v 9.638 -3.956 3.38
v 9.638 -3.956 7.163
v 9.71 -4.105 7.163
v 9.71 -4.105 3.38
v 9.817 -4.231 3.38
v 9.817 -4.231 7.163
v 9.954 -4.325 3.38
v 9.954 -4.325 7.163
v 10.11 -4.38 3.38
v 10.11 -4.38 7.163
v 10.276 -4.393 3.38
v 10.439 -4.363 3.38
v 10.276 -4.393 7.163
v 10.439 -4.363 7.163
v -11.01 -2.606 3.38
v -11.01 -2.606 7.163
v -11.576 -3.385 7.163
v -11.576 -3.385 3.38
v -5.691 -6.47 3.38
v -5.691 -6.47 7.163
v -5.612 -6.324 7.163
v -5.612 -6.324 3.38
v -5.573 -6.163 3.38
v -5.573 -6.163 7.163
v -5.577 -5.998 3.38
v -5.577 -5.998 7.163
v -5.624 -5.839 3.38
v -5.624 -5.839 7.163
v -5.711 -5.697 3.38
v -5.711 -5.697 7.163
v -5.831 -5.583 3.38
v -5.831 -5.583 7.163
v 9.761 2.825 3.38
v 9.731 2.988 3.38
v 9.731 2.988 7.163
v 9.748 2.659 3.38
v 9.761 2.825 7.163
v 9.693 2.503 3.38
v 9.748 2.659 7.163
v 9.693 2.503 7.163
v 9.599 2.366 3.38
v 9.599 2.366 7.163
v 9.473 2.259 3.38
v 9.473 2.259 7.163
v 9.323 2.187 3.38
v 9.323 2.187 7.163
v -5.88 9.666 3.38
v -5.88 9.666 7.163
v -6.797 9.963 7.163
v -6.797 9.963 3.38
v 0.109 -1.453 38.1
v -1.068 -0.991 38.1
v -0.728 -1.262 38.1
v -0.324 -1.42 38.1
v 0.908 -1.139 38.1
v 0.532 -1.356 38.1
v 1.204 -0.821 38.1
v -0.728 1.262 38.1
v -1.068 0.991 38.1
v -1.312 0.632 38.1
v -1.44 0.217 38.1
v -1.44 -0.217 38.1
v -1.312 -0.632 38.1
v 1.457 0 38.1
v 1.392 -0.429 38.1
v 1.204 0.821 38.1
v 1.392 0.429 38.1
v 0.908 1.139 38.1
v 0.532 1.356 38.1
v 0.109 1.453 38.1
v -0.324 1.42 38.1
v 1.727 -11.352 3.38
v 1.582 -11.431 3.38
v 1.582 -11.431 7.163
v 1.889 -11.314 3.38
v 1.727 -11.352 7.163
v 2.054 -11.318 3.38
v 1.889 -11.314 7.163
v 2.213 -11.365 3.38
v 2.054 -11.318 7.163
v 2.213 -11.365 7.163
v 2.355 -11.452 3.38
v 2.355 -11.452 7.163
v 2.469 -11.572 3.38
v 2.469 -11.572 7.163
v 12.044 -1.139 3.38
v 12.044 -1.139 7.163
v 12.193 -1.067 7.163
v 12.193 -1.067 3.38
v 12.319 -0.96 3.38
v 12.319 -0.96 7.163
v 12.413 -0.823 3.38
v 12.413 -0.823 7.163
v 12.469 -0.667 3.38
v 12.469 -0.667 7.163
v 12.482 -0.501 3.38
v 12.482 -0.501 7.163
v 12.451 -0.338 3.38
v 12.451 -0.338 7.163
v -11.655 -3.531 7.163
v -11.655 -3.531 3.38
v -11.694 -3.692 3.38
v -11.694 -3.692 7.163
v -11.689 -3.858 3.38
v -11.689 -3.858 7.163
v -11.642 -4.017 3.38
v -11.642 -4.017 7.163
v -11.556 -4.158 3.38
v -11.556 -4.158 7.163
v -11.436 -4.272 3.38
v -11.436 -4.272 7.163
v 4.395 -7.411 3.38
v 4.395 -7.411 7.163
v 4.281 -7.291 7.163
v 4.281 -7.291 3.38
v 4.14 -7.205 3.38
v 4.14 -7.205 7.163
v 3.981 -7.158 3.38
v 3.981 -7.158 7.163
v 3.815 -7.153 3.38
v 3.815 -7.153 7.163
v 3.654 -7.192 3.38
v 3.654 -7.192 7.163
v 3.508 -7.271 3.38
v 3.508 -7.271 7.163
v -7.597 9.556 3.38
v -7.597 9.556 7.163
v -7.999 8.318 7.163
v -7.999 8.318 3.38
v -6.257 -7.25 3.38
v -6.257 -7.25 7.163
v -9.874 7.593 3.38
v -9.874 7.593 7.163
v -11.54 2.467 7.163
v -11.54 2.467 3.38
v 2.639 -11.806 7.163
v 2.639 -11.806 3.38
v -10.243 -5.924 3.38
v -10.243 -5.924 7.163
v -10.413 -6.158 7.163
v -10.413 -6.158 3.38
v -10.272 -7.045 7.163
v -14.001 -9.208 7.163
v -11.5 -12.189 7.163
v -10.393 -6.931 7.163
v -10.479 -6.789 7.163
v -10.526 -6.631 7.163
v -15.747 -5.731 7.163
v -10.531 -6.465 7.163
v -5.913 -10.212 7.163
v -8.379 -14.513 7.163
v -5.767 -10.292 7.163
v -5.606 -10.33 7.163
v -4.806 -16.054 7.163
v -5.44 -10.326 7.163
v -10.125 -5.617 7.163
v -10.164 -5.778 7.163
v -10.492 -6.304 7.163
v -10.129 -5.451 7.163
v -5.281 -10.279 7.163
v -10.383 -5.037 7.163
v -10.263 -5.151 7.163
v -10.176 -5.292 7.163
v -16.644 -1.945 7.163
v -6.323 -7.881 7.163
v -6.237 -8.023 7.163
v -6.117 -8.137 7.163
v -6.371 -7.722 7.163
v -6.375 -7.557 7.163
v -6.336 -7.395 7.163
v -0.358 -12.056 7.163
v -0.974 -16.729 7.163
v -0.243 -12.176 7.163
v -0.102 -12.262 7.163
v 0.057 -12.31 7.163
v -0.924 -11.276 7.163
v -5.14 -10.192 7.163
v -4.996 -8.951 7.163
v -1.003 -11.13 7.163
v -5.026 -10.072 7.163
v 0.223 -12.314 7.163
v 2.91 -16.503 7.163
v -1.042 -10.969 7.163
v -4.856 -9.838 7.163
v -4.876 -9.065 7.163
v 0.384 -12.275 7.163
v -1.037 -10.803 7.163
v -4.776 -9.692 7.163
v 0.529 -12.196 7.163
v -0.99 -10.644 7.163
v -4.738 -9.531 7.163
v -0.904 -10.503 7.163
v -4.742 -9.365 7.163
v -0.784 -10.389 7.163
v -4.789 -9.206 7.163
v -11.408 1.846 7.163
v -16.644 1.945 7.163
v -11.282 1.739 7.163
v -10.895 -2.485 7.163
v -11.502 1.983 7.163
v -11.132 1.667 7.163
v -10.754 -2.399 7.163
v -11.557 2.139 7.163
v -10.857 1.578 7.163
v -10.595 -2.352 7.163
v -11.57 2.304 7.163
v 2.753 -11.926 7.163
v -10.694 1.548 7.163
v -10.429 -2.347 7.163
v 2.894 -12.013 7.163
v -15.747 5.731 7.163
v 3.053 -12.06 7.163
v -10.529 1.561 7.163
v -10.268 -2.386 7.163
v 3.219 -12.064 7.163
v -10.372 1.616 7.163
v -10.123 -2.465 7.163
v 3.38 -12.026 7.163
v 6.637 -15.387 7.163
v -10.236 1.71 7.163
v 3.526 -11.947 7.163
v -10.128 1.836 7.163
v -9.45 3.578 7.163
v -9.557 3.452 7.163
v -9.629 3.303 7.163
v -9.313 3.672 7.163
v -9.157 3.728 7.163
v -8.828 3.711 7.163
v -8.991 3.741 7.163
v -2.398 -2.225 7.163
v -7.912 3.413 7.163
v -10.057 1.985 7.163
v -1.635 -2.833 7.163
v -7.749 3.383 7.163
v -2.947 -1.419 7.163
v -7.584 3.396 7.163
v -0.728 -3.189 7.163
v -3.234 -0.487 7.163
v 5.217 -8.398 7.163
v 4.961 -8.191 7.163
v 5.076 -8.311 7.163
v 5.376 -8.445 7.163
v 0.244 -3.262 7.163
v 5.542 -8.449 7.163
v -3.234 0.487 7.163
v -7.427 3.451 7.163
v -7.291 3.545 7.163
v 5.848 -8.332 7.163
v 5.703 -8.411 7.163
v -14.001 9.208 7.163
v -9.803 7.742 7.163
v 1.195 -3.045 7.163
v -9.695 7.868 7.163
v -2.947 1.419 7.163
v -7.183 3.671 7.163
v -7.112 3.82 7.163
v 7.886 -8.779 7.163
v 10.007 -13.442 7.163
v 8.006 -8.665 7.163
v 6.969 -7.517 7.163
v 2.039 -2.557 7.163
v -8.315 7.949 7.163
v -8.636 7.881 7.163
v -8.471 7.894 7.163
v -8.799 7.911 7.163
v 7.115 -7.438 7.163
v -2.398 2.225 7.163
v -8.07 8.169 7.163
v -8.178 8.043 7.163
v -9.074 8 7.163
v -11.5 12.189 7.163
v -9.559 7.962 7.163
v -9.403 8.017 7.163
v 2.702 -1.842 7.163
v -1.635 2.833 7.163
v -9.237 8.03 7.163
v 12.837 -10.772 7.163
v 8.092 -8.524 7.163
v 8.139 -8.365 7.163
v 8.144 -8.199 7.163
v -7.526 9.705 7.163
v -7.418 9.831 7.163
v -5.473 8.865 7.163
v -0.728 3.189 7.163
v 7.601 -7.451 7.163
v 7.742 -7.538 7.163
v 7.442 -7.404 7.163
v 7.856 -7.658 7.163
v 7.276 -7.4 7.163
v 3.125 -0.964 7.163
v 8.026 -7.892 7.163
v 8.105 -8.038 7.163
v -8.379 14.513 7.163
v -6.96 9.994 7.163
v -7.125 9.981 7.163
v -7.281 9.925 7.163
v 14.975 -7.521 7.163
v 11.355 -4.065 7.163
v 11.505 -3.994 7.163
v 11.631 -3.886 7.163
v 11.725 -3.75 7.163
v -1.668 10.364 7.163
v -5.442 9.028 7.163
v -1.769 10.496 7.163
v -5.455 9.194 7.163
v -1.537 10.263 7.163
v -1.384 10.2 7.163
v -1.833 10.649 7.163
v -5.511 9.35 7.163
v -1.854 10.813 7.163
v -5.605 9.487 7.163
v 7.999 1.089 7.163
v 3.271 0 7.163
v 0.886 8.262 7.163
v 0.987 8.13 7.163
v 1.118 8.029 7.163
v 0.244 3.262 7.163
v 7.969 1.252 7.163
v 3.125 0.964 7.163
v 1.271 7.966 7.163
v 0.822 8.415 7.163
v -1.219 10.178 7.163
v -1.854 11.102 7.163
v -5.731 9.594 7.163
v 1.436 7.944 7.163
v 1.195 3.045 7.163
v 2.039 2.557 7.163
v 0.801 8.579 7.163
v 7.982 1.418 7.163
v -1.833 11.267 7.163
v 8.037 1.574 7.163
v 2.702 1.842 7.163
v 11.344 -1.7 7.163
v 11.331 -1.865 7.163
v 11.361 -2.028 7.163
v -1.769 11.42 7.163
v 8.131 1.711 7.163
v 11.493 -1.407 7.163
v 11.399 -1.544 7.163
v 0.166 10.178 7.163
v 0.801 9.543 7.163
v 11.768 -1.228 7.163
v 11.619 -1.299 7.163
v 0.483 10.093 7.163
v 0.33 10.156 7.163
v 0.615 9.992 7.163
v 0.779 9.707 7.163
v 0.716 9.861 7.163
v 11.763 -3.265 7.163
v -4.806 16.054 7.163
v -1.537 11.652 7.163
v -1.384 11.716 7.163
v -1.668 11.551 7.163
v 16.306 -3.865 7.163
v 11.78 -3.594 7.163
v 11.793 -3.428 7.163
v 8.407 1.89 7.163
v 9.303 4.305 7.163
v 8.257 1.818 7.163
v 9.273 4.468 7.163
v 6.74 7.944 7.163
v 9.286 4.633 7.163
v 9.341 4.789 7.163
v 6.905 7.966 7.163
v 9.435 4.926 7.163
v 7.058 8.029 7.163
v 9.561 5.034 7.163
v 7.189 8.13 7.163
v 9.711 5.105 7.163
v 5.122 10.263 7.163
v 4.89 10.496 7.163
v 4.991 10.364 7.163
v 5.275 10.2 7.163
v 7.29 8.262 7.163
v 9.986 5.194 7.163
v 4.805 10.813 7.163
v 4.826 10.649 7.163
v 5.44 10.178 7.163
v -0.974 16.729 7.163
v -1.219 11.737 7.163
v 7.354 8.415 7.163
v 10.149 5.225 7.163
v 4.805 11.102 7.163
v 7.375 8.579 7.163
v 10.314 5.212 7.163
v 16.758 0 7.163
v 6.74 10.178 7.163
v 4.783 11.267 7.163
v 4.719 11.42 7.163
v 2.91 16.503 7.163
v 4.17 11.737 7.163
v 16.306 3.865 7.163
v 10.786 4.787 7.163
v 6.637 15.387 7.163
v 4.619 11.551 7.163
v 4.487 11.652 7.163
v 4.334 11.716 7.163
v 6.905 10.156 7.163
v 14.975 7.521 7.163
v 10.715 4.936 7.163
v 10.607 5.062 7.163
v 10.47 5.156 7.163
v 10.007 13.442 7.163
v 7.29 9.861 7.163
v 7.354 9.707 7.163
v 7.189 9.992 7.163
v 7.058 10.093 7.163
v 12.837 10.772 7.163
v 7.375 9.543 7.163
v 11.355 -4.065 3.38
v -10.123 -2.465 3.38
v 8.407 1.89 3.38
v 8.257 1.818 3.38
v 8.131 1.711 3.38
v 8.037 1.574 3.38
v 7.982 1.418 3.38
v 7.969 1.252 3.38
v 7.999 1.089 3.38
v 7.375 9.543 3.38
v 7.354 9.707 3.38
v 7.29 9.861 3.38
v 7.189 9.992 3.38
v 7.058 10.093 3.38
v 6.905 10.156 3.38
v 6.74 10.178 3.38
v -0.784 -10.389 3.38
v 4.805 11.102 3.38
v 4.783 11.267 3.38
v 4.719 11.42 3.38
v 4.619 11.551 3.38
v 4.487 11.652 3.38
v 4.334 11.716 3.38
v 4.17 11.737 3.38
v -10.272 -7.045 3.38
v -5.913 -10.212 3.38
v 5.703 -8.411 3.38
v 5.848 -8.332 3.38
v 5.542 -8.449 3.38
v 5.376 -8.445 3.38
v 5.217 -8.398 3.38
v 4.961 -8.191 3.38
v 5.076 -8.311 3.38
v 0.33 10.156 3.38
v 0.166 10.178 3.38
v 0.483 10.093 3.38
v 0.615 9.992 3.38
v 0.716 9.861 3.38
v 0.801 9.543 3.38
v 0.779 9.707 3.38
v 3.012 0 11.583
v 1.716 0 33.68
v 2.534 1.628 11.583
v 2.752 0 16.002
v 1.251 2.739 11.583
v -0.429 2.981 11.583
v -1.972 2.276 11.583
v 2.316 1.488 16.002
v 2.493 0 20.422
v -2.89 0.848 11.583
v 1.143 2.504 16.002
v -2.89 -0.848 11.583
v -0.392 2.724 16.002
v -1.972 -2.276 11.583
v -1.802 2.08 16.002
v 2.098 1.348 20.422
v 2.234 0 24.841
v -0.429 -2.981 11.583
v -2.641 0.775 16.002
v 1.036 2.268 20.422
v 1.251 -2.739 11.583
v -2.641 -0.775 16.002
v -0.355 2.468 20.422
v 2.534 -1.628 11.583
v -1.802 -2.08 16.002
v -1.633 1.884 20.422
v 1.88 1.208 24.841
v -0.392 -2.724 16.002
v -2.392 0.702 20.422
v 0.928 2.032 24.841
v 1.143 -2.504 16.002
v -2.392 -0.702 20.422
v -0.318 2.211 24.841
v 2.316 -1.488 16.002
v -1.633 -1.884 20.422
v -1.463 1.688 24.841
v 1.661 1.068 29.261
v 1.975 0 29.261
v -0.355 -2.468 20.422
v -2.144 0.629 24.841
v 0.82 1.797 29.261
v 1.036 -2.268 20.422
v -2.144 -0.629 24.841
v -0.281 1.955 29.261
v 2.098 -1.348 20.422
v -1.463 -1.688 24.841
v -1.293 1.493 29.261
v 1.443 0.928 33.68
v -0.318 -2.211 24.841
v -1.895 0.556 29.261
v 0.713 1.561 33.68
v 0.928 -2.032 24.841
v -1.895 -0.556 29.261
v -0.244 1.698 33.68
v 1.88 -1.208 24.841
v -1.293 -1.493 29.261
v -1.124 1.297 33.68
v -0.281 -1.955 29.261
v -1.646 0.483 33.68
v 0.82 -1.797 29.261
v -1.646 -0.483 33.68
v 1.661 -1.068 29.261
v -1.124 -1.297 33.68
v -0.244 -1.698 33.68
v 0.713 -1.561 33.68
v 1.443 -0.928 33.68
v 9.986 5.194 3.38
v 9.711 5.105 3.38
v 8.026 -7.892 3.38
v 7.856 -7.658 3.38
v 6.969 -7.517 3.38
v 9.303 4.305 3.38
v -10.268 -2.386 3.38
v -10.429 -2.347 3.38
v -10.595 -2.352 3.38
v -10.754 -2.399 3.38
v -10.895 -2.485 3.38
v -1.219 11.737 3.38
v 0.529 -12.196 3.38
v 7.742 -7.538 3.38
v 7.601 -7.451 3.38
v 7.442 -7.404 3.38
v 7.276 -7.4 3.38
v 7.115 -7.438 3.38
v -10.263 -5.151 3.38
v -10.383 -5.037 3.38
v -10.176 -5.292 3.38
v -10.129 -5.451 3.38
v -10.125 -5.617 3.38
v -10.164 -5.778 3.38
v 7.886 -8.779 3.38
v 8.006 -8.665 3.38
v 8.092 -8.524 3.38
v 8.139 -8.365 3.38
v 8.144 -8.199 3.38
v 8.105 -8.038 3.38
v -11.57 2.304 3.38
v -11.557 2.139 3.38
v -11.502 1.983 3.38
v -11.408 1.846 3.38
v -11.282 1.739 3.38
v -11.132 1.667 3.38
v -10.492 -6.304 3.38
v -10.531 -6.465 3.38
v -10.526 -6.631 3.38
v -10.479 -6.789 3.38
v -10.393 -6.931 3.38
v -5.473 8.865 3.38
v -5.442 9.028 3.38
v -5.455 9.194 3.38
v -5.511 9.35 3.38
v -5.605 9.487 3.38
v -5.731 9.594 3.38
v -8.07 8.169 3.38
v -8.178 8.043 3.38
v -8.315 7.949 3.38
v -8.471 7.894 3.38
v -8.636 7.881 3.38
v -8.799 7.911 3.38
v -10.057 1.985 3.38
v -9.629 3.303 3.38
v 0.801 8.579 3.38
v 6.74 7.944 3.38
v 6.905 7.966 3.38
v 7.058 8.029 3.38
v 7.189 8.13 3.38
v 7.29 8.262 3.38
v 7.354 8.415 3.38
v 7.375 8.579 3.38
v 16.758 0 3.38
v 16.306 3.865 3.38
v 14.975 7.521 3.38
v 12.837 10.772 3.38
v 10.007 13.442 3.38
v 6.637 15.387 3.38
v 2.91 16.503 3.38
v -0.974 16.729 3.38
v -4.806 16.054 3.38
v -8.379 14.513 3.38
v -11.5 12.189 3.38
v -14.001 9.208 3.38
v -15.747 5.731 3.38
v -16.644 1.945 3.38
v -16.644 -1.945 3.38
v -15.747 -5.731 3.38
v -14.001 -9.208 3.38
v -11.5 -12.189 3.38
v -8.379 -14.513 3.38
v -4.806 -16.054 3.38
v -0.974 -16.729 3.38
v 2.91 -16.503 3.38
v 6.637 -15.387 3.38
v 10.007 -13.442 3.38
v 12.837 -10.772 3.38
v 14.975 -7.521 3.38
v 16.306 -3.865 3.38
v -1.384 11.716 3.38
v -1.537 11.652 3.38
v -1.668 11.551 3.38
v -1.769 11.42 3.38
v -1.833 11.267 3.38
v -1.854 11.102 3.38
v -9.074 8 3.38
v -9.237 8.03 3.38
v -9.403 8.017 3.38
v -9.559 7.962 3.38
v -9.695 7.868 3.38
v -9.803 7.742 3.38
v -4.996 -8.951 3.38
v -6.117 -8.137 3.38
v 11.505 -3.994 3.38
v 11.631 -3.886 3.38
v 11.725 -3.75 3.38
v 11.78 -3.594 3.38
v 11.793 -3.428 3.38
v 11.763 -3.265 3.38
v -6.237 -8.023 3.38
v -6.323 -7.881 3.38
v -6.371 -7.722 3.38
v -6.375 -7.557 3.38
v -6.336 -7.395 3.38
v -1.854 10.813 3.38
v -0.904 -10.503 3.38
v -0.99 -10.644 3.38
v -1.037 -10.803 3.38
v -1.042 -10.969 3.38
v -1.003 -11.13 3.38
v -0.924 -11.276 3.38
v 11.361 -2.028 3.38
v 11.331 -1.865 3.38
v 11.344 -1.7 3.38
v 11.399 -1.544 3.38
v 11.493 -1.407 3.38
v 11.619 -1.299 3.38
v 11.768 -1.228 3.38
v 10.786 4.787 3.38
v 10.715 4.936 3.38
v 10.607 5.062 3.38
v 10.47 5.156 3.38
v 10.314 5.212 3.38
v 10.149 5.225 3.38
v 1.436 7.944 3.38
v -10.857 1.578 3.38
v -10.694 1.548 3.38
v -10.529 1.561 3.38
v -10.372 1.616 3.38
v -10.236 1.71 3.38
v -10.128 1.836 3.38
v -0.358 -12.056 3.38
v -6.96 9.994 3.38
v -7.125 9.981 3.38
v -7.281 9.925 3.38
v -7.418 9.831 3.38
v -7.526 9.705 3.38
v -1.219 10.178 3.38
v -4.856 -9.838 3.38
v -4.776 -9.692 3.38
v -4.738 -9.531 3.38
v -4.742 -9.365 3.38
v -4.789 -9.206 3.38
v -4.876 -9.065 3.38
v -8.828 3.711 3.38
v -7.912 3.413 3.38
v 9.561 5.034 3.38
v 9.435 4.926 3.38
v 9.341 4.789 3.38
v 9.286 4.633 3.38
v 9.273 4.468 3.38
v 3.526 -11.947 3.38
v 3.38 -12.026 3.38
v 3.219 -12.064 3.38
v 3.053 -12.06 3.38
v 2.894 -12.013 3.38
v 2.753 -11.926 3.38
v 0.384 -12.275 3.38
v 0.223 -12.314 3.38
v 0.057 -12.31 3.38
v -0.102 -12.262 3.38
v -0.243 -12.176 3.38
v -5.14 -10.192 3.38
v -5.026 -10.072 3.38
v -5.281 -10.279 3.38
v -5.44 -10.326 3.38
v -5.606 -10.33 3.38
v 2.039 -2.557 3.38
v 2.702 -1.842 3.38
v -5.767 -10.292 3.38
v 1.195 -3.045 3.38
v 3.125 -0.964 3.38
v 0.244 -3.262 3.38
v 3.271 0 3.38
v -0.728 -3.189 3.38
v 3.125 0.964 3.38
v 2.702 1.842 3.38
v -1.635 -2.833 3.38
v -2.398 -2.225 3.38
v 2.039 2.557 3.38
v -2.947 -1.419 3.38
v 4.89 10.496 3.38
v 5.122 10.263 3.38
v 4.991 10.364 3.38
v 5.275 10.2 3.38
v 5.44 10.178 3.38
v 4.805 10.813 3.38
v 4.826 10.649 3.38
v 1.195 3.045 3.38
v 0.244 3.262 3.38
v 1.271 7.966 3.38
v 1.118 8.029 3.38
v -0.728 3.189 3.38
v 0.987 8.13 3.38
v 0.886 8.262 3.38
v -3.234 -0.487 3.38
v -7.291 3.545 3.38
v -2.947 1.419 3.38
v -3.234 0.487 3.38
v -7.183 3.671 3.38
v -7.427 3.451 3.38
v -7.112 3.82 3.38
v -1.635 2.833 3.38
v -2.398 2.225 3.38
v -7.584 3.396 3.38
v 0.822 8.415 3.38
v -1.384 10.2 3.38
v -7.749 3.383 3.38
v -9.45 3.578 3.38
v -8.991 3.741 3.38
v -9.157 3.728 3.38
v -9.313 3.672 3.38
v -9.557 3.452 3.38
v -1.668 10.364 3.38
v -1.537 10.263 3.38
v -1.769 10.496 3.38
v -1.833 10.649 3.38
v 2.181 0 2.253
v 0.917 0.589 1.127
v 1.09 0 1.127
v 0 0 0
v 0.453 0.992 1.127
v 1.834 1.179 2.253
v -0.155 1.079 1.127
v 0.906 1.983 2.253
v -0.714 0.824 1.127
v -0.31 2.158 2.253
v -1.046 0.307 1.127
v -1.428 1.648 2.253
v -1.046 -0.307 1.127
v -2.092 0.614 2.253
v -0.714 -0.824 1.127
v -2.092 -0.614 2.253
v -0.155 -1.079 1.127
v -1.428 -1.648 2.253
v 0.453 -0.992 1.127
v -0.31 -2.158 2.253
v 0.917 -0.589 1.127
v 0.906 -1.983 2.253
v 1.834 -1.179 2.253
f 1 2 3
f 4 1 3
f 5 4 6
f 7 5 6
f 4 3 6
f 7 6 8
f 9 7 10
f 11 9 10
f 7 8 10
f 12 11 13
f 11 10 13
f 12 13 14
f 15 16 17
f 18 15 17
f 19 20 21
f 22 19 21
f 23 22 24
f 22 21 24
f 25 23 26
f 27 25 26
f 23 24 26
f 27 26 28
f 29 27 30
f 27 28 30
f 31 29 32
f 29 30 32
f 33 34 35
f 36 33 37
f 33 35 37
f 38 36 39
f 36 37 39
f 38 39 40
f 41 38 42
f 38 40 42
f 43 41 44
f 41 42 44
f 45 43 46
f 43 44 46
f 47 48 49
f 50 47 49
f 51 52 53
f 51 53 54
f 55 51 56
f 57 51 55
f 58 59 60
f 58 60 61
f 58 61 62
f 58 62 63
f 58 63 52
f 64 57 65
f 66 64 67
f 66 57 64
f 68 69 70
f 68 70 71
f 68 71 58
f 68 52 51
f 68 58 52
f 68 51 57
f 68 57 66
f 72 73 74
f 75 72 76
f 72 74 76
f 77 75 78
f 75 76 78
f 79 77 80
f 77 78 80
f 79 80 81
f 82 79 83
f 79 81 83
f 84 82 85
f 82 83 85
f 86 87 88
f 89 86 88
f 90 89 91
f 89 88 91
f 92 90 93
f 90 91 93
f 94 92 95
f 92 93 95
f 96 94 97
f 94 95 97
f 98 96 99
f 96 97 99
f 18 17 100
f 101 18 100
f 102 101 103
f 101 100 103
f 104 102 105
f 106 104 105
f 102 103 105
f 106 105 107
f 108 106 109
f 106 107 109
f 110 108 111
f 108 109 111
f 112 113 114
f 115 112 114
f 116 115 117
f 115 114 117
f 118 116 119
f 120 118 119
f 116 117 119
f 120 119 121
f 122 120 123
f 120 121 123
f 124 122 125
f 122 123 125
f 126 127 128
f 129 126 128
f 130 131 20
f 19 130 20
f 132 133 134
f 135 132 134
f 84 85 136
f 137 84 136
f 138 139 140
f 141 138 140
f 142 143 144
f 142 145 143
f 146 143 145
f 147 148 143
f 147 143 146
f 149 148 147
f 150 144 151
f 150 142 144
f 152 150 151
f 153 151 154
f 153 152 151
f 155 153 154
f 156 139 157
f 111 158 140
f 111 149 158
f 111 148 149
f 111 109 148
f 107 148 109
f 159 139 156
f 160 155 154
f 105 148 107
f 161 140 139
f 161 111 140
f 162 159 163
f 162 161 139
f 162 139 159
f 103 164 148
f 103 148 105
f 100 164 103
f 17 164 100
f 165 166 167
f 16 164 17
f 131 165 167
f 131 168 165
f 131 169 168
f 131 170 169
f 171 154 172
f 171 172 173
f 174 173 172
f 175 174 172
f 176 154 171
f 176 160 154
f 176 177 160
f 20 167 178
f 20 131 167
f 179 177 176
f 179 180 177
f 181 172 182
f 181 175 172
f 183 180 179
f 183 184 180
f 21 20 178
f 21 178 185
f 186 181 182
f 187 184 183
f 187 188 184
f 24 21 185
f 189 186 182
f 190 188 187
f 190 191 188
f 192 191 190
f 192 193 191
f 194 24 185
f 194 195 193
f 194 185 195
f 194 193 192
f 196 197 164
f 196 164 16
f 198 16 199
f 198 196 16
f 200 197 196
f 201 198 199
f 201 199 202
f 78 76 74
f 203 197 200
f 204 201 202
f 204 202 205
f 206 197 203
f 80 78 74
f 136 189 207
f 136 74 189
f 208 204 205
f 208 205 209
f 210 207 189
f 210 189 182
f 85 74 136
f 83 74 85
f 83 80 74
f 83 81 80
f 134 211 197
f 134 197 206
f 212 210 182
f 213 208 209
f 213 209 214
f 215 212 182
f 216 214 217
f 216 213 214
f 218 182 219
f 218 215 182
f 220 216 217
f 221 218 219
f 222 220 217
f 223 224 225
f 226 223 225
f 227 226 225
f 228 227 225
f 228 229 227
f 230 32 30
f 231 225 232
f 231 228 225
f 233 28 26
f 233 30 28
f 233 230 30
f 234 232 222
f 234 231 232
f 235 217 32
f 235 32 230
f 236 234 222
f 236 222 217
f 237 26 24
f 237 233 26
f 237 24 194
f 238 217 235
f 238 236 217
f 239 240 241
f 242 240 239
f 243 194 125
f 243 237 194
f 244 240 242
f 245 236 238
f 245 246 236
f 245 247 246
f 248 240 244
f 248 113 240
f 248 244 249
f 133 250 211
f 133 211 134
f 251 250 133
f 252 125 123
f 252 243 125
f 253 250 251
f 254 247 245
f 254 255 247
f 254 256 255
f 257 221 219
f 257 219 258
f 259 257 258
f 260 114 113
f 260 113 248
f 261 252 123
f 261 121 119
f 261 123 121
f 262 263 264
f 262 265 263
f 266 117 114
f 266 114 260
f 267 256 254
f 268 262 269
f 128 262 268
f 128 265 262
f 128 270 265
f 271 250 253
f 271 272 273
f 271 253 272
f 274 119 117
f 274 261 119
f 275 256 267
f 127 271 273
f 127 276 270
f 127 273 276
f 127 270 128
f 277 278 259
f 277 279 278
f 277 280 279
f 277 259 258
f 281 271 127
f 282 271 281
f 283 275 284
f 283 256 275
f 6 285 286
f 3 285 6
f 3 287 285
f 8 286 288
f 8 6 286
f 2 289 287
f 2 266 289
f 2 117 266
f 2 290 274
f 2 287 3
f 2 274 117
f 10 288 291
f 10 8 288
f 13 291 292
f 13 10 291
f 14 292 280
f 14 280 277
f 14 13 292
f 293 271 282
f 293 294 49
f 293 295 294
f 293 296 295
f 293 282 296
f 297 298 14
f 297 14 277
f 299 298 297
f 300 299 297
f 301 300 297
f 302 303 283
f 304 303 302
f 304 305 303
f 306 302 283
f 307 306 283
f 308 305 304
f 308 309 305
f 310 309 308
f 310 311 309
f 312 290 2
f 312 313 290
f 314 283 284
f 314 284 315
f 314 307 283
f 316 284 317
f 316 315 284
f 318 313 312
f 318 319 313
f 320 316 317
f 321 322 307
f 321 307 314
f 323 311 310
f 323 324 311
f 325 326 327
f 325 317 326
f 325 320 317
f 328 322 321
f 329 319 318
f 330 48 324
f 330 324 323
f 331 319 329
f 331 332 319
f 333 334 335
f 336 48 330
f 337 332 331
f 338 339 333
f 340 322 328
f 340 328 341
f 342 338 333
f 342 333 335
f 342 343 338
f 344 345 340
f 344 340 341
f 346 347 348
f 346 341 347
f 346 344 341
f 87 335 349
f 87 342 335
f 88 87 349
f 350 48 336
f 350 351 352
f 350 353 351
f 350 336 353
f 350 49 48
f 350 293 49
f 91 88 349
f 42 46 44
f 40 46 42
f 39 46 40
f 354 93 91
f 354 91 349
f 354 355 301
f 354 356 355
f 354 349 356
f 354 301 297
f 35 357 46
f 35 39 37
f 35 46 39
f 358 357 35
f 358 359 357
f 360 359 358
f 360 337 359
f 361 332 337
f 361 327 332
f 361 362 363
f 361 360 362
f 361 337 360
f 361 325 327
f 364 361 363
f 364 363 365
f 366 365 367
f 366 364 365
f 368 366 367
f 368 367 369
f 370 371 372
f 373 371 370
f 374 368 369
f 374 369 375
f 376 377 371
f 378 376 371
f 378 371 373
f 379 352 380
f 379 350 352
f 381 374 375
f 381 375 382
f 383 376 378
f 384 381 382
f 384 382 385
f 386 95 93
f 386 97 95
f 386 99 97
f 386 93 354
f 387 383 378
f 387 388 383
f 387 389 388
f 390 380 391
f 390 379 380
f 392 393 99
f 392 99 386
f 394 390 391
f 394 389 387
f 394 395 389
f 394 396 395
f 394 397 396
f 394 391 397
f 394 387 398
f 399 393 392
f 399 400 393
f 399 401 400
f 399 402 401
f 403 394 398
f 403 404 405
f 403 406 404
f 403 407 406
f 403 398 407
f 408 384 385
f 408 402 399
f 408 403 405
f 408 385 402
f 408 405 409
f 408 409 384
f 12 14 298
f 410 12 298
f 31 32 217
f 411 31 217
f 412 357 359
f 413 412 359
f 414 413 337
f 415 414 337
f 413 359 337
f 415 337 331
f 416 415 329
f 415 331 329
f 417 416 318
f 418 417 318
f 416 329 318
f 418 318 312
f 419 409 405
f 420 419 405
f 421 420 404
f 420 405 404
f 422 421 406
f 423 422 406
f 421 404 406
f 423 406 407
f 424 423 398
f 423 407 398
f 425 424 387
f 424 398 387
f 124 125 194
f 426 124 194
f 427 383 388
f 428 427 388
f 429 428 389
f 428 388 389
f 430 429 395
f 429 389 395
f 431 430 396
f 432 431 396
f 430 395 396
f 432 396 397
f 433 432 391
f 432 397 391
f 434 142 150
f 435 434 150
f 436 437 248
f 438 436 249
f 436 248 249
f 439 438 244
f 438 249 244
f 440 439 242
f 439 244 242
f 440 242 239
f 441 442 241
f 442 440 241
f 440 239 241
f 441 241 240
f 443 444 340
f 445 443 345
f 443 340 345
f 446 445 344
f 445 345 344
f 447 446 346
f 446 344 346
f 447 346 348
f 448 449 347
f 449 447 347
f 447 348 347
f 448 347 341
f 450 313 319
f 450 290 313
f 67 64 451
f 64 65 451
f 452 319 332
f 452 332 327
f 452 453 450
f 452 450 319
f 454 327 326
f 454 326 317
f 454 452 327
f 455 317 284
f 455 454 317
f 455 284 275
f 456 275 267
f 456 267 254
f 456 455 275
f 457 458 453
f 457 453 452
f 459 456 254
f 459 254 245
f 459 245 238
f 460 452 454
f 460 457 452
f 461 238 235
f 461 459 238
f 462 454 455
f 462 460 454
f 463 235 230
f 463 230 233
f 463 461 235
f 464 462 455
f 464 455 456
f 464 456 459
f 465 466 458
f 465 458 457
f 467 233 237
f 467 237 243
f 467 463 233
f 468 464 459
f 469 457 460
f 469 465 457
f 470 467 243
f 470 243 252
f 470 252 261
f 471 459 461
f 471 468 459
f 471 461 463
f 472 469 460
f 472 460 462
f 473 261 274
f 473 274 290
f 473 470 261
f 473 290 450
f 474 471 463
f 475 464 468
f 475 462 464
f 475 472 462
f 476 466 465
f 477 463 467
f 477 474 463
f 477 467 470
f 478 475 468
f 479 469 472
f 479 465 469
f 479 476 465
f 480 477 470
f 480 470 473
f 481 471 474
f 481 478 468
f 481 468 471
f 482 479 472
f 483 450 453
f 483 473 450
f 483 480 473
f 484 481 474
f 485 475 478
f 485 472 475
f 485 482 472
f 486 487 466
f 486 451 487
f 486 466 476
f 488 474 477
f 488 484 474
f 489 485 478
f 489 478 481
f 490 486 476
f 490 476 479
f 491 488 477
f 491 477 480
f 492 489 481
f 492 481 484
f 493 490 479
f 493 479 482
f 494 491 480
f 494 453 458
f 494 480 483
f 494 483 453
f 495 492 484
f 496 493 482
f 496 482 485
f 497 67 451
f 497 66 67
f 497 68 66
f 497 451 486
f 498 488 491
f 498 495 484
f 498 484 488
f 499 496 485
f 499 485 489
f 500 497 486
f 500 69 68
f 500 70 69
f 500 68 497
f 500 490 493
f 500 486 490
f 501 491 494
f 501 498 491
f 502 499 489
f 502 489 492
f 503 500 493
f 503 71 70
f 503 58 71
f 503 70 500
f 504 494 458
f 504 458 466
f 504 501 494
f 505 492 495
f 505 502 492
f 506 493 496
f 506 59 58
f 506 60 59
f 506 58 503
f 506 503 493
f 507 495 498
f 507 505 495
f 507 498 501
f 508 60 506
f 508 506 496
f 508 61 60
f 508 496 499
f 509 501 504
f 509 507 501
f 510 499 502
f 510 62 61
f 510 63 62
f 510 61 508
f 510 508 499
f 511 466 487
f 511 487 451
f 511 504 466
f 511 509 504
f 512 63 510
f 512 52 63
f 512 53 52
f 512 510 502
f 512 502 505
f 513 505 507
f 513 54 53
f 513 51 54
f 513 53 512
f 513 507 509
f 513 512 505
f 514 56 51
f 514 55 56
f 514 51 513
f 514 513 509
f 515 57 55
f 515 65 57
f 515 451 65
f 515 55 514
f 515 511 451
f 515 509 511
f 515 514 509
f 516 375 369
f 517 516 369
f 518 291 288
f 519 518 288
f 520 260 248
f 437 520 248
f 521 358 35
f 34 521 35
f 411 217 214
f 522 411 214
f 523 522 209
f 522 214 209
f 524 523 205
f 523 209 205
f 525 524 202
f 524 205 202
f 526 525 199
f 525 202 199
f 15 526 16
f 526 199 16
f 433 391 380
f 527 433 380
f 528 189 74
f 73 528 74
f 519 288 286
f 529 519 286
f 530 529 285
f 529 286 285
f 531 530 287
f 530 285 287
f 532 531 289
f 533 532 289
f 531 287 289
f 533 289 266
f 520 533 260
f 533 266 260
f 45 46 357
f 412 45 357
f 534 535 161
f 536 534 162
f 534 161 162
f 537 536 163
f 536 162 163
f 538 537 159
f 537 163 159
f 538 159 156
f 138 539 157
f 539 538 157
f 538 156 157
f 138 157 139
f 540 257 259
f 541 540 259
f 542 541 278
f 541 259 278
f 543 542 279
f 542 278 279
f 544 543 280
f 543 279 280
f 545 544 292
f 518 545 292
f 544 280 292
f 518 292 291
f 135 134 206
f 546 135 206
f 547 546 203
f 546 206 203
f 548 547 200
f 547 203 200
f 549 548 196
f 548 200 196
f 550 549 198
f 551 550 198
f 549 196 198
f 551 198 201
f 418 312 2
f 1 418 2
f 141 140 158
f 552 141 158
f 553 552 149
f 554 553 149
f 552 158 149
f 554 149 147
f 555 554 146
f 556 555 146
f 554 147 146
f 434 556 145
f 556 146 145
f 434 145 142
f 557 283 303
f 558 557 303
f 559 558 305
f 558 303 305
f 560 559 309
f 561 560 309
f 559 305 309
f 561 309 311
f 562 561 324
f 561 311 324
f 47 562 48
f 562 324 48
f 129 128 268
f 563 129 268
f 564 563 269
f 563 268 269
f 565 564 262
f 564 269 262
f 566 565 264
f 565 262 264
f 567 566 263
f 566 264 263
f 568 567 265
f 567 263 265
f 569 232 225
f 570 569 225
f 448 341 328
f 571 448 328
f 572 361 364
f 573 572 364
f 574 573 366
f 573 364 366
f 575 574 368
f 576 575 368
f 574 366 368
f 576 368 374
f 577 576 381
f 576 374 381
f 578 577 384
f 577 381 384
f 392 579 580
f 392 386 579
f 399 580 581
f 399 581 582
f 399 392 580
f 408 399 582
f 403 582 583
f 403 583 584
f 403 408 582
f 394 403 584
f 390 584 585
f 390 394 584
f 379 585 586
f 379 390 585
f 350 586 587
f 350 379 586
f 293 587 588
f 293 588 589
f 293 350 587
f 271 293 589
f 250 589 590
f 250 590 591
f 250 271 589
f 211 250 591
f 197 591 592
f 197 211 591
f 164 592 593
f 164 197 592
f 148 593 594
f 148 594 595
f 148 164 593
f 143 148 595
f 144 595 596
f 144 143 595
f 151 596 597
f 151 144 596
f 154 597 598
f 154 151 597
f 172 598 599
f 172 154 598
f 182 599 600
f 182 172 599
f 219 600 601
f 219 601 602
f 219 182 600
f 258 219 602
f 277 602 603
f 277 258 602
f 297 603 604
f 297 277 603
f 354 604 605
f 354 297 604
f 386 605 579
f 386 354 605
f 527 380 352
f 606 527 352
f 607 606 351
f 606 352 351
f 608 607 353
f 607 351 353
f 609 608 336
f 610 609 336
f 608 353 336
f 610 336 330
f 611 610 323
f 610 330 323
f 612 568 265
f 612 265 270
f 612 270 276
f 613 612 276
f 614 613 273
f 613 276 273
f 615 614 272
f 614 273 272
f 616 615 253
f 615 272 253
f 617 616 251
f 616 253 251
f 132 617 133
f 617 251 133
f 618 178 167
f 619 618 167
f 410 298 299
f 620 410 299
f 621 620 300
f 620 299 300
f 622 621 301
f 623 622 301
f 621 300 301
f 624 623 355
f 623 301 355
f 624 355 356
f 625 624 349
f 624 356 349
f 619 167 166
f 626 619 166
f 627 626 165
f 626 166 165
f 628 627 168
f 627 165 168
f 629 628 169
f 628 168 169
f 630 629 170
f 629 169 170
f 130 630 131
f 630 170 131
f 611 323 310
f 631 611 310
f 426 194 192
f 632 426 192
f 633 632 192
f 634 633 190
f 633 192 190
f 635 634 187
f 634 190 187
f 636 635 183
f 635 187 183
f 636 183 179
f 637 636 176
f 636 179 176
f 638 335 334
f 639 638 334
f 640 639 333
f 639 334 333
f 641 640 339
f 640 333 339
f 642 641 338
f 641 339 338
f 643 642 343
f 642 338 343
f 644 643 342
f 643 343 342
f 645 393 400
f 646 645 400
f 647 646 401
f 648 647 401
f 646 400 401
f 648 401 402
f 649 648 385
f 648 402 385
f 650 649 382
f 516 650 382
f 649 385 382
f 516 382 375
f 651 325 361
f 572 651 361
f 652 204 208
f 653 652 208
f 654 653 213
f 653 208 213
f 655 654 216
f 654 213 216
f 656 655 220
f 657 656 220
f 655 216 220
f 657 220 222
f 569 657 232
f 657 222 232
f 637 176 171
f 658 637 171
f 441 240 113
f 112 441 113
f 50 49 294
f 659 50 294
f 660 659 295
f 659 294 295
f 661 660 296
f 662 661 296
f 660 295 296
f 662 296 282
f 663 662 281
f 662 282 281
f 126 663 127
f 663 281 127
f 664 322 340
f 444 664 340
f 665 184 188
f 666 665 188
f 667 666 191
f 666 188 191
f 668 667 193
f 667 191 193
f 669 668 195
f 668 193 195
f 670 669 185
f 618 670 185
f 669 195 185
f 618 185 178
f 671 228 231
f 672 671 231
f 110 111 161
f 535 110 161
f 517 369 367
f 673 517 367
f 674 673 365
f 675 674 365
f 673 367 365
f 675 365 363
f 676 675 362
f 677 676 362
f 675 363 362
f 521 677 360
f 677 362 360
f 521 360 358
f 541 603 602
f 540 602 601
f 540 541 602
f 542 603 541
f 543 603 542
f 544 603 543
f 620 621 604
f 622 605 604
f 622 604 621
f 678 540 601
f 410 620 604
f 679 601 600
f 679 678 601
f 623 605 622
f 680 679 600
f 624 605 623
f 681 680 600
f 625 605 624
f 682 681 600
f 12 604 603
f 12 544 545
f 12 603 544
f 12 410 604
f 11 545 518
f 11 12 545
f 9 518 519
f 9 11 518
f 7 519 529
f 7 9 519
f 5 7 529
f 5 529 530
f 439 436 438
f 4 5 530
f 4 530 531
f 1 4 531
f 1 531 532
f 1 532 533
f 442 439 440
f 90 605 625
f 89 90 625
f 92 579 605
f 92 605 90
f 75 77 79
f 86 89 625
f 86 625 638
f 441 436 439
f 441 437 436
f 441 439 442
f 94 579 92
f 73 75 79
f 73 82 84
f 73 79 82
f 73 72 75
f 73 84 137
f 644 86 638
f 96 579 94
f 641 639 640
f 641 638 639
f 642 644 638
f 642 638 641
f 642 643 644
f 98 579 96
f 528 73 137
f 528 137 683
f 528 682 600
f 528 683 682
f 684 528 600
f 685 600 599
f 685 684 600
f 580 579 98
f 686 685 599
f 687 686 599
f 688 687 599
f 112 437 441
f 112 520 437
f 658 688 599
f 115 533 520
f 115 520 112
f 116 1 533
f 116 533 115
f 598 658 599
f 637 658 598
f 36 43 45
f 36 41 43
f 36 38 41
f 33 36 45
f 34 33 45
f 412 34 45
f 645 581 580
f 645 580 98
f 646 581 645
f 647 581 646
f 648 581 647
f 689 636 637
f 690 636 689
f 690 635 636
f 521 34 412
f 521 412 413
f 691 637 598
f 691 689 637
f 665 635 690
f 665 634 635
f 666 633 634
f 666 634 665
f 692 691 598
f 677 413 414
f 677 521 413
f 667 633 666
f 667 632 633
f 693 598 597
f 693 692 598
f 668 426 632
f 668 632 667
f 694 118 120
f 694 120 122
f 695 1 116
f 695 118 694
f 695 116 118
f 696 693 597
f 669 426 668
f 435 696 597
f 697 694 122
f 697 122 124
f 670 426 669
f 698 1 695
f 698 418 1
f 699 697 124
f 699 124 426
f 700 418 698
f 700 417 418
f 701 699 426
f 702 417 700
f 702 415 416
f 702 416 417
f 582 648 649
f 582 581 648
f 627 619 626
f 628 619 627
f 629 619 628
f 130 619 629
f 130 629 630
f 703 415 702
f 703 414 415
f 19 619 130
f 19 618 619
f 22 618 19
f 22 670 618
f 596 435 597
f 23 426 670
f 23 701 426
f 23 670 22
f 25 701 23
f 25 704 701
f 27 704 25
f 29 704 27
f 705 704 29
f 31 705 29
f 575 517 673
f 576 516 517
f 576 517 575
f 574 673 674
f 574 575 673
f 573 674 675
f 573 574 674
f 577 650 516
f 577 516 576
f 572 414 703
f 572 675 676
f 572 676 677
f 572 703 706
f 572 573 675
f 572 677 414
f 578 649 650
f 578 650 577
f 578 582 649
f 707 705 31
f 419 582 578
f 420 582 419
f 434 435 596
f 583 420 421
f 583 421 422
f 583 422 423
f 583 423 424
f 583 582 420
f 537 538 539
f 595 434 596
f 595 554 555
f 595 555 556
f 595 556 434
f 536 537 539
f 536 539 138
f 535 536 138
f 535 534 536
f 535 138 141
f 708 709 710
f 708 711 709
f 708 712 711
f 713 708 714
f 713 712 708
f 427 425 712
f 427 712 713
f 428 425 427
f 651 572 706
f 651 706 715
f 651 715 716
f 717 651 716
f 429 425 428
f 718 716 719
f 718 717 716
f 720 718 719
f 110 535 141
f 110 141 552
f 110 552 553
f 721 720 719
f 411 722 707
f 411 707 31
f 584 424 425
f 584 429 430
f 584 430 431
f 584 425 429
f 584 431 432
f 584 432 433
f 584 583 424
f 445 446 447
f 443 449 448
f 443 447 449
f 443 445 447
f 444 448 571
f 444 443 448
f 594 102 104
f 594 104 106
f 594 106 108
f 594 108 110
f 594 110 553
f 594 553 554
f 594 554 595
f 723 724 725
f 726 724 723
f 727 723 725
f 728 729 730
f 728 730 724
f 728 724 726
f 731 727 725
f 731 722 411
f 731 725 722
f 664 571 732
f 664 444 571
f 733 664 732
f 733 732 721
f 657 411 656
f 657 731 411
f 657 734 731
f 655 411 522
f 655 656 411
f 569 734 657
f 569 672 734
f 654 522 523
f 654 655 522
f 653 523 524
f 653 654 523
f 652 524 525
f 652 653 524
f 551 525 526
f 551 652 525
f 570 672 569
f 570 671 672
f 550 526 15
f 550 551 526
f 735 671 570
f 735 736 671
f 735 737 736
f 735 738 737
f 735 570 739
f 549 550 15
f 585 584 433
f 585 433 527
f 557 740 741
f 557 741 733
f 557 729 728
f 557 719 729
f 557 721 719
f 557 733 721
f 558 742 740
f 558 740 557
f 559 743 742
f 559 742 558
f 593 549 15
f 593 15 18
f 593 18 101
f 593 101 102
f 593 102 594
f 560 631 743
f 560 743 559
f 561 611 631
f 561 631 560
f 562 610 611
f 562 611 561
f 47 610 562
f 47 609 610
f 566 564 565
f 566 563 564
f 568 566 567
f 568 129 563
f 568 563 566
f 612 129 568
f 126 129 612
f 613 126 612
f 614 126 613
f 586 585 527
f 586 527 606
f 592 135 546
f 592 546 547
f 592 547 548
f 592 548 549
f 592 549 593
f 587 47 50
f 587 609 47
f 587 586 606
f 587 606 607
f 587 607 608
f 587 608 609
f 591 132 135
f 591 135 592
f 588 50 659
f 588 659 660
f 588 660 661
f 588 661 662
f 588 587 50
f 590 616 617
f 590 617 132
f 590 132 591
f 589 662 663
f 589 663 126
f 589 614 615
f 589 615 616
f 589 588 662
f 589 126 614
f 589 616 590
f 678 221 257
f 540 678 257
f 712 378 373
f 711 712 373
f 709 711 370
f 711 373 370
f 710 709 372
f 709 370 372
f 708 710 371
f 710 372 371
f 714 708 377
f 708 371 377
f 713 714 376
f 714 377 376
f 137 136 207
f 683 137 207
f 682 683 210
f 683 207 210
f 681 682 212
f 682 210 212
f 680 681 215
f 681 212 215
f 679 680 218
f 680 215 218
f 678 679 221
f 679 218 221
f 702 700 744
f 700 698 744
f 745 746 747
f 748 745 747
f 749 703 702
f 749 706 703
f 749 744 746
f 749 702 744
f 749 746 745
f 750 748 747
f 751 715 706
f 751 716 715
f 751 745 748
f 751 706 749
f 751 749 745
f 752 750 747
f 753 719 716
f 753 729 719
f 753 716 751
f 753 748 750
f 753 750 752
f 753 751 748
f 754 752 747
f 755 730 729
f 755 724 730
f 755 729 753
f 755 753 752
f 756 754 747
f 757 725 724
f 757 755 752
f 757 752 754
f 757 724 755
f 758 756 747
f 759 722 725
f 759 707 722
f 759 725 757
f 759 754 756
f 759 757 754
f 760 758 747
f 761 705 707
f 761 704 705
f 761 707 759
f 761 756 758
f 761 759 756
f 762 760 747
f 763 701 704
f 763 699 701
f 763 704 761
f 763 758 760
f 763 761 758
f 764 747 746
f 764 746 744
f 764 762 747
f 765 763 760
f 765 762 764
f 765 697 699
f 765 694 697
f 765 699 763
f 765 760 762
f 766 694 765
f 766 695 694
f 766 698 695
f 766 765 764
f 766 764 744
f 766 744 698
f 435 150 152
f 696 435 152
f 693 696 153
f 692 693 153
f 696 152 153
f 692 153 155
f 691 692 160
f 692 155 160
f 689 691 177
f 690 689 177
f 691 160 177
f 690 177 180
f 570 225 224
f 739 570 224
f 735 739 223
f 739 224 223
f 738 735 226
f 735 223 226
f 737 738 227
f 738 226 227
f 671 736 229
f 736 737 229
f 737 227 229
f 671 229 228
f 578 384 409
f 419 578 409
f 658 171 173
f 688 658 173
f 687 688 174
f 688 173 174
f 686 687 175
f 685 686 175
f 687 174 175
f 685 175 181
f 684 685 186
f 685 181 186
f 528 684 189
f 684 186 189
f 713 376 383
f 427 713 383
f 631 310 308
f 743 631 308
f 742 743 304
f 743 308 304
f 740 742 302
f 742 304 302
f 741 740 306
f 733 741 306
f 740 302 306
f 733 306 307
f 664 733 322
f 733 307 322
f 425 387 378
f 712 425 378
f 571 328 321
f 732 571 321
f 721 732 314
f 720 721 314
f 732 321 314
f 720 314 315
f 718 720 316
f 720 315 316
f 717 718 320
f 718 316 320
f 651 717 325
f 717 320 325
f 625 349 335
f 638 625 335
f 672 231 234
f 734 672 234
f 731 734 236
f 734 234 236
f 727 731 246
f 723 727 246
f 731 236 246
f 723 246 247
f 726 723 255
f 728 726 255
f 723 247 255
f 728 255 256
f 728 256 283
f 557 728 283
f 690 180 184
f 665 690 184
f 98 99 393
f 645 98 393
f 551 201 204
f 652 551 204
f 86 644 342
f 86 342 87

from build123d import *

# Parameters (mm, degrees)
F3_DEPTH = 7.164216


with BuildPart() as f1:
    # F0 (on Front) → F1 (revolve)
    with BuildSketch(Plane.XZ):
        Polygon((0, 38.1), (0, 0), (3.270783, 3.380191), (16.757639, 3.380191), (16.757639, 7.163216), (3.270783, 7.163216), (1.456713, 38.1), align=None)
    revolve(axis=Axis((0, 0, 19.05), (0, 0, 1)))

    # F2 (on face) → F3 (cut, through all)
    with BuildSketch(Plane.XY.offset(7.163216)):
        with BuildLine():
            Line((4.169526, 11.737372), (-1.219378, 11.737372))
            ThreePointArc((-1.219378, 11.737372), (-1.668391, 11.551385), (-1.854378, 11.102372))
            Line((-1.854378, 11.102372), (-1.854378, 10.813008))
            ThreePointArc((-1.854378, 10.813008), (-1.668391, 10.363995), (-1.219378, 10.178008))
            Line((-1.219378, 10.178008), (0.165754, 10.178008))
            ThreePointArc((0.165754, 10.178008), (0.614767, 9.992021), (0.800754, 9.543008))
            Line((0.800754, 9.543008), (0.800754, 8.579325))
            ThreePointArc((0.800754, 8.579325), (0.986741, 8.130312), (1.435754, 7.944325))
            Line((1.435754, 7.944325), (6.740368, 7.944325))
            ThreePointArc((6.740368, 7.944325), (7.189381, 8.130312), (7.375368, 8.579325))
            Line((7.375368, 8.579325), (7.375368, 9.543008))
            ThreePointArc((7.375368, 9.543008), (7.189381, 9.992021), (6.740368, 10.178008))
            Line((6.740368, 10.178008), (5.439526, 10.178008))
            ThreePointArc((5.439526, 10.178008), (4.990513, 10.363995), (4.804526, 10.813008))
            Line((4.804526, 10.813008), (4.804526, 11.102372))
            ThreePointArc((4.804526, 11.102372), (4.618538, 11.551385), (4.169526, 11.737372))
        make_face()
        with BuildLine():
            Line((-9.87445, 7.592502), (-11.539712, 2.46735))
            ThreePointArc((-11.539712, 2.46735), (-11.501581, 1.98284), (-11.132017, 1.667203))
            Line((-11.132017, 1.667203), (-10.856816, 1.577785))
            ThreePointArc((-10.856816, 1.577785), (-10.372306, 1.615917), (-10.05667, 1.98548))
            Line((-10.05667, 1.98548), (-9.62864, 3.302819))
            ThreePointArc((-9.62864, 3.302819), (-9.313003, 3.672382), (-8.828493, 3.710514))
            Line((-8.828493, 3.710514), (-7.911976, 3.41272))
            ThreePointArc((-7.911976, 3.41272), (-7.427467, 3.450851), (-7.11183, 3.820415))
            Line((-7.11183, 3.820415), (-5.472614, 8.865403))
            ThreePointArc((-5.472614, 8.865403), (-5.510745, 9.349912), (-5.880309, 9.665549))
            Line((-5.880309, 9.665549), (-6.796826, 9.963344))
            ThreePointArc((-6.796826, 9.963344), (-7.281336, 9.925212), (-7.596973, 9.555649))
            Line((-7.596973, 9.555649), (-7.998955, 8.318474))
            ThreePointArc((-7.998955, 8.318474), (-8.314592, 7.94891), (-8.799102, 7.910779))
            Line((-8.799102, 7.910779), (-9.074303, 8.000197))
            ThreePointArc((-9.074303, 8.000197), (-9.558813, 7.962065), (-9.87445, 7.592502))
        make_face()
        with BuildLine():
            Line((-10.272271, -7.044948), (-5.912556, -10.212466))
            ThreePointArc((-5.912556, -10.212466), (-5.439977, -10.325922), (-5.025587, -10.071984))
            Line((-5.025587, -10.071984), (-4.855503, -9.837883))
            ThreePointArc((-4.855503, -9.837883), (-4.742047, -9.365304), (-4.995985, -8.950914))
            Line((-4.995985, -8.950914), (-6.116581, -8.136754))
            ThreePointArc((-6.116581, -8.136754), (-6.37052, -7.722364), (-6.257063, -7.249784))
            Line((-6.257063, -7.249784), (-5.690624, -6.470148))
            ThreePointArc((-5.690624, -6.470148), (-5.577168, -5.997569), (-5.831107, -5.583179))
            Line((-5.831107, -5.583179), (-10.12263, -2.465205))
            ThreePointArc((-10.12263, -2.465205), (-10.595209, -2.351748), (-11.009599, -2.605687))
            Line((-11.009599, -2.605687), (-11.576038, -3.385323))
            ThreePointArc((-11.576038, -3.385323), (-11.689494, -3.857902), (-11.435556, -4.272292))
            Line((-11.435556, -4.272292), (-10.383152, -5.036909))
            ThreePointArc((-10.383152, -5.036909), (-10.129213, -5.451299), (-10.24267, -5.923878))
            Line((-10.24267, -5.923878), (-10.412753, -6.157978))
            ThreePointArc((-10.412753, -6.157978), (-10.52621, -6.630558), (-10.272271, -7.044948))
        make_face()
        with BuildLine():
            Line((3.525837, -11.946519), (7.885552, -8.779001))
            ThreePointArc((7.885552, -8.779001), (8.13949, -8.364611), (8.026034, -7.892031))
            Line((8.026034, -7.892031), (7.85595, -7.657931))
            ThreePointArc((7.85595, -7.657931), (7.44156, -7.403993), (6.968981, -7.517449))
            Line((6.968981, -7.517449), (5.848385, -8.331609))
            ThreePointArc((5.848385, -8.331609), (5.375806, -8.445066), (4.961416, -8.191127))
            Line((4.961416, -8.191127), (4.394977, -7.411491))
            ThreePointArc((4.394977, -7.411491), (3.980587, -7.157553), (3.508007, -7.271009))
            Line((3.508007, -7.271009), (-0.783516, -10.388983))
            ThreePointArc((-0.783516, -10.388983), (-1.037454, -10.803373), (-0.923998, -11.275952))
            Line((-0.923998, -11.275952), (-0.357559, -12.055589))
            ThreePointArc((-0.357559, -12.055589), (0.056831, -12.309527), (0.52941, -12.196071))
            Line((0.52941, -12.196071), (1.581814, -11.431454))
            ThreePointArc((1.581814, -11.431454), (2.054394, -11.317998), (2.468784, -11.571937))
            Line((2.468784, -11.571937), (2.638868, -11.806037))
            ThreePointArc((2.638868, -11.806037), (3.053258, -12.059975), (3.525837, -11.946519))
        make_face()
        with BuildLine():
            Line((12.451358, -0.338407), (10.786095, 4.786745))
            ThreePointArc((10.786095, 4.786745), (10.470458, 5.156308), (9.985949, 5.19444))
            Line((9.985949, 5.19444), (9.710747, 5.105022))
            ThreePointArc((9.710747, 5.105022), (9.341184, 4.789385), (9.303052, 4.304875))
            Line((9.303052, 4.304875), (9.731082, 2.987536))
            ThreePointArc((9.731082, 2.987536), (9.69295, 2.503026), (9.323387, 2.187389))
            Line((9.323387, 2.187389), (8.40687, 1.889595))
            ThreePointArc((8.40687, 1.889595), (8.037306, 1.573958), (7.999175, 1.089448))
            Line((7.999175, 1.089448), (9.63839, -3.95554))
            ThreePointArc((9.63839, -3.95554), (9.954027, -4.325103), (10.438537, -4.363235))
            Line((10.438537, -4.363235), (11.355054, -4.06544))
            ThreePointArc((11.355054, -4.06544), (11.724618, -3.749804), (11.762749, -3.265294))
            Line((11.762749, -3.265294), (11.360767, -2.028119))
            ThreePointArc((11.360767, -2.028119), (11.398899, -1.543609), (11.768462, -1.227972))
            Line((11.768462, -1.227972), (12.043663, -1.138554))
            ThreePointArc((12.043663, -1.138554), (12.413226, -0.822917), (12.451358, -0.338407))
        make_face()
    extrude(amount=-F3_DEPTH, mode=Mode.SUBTRACT)


solid = f1.part
